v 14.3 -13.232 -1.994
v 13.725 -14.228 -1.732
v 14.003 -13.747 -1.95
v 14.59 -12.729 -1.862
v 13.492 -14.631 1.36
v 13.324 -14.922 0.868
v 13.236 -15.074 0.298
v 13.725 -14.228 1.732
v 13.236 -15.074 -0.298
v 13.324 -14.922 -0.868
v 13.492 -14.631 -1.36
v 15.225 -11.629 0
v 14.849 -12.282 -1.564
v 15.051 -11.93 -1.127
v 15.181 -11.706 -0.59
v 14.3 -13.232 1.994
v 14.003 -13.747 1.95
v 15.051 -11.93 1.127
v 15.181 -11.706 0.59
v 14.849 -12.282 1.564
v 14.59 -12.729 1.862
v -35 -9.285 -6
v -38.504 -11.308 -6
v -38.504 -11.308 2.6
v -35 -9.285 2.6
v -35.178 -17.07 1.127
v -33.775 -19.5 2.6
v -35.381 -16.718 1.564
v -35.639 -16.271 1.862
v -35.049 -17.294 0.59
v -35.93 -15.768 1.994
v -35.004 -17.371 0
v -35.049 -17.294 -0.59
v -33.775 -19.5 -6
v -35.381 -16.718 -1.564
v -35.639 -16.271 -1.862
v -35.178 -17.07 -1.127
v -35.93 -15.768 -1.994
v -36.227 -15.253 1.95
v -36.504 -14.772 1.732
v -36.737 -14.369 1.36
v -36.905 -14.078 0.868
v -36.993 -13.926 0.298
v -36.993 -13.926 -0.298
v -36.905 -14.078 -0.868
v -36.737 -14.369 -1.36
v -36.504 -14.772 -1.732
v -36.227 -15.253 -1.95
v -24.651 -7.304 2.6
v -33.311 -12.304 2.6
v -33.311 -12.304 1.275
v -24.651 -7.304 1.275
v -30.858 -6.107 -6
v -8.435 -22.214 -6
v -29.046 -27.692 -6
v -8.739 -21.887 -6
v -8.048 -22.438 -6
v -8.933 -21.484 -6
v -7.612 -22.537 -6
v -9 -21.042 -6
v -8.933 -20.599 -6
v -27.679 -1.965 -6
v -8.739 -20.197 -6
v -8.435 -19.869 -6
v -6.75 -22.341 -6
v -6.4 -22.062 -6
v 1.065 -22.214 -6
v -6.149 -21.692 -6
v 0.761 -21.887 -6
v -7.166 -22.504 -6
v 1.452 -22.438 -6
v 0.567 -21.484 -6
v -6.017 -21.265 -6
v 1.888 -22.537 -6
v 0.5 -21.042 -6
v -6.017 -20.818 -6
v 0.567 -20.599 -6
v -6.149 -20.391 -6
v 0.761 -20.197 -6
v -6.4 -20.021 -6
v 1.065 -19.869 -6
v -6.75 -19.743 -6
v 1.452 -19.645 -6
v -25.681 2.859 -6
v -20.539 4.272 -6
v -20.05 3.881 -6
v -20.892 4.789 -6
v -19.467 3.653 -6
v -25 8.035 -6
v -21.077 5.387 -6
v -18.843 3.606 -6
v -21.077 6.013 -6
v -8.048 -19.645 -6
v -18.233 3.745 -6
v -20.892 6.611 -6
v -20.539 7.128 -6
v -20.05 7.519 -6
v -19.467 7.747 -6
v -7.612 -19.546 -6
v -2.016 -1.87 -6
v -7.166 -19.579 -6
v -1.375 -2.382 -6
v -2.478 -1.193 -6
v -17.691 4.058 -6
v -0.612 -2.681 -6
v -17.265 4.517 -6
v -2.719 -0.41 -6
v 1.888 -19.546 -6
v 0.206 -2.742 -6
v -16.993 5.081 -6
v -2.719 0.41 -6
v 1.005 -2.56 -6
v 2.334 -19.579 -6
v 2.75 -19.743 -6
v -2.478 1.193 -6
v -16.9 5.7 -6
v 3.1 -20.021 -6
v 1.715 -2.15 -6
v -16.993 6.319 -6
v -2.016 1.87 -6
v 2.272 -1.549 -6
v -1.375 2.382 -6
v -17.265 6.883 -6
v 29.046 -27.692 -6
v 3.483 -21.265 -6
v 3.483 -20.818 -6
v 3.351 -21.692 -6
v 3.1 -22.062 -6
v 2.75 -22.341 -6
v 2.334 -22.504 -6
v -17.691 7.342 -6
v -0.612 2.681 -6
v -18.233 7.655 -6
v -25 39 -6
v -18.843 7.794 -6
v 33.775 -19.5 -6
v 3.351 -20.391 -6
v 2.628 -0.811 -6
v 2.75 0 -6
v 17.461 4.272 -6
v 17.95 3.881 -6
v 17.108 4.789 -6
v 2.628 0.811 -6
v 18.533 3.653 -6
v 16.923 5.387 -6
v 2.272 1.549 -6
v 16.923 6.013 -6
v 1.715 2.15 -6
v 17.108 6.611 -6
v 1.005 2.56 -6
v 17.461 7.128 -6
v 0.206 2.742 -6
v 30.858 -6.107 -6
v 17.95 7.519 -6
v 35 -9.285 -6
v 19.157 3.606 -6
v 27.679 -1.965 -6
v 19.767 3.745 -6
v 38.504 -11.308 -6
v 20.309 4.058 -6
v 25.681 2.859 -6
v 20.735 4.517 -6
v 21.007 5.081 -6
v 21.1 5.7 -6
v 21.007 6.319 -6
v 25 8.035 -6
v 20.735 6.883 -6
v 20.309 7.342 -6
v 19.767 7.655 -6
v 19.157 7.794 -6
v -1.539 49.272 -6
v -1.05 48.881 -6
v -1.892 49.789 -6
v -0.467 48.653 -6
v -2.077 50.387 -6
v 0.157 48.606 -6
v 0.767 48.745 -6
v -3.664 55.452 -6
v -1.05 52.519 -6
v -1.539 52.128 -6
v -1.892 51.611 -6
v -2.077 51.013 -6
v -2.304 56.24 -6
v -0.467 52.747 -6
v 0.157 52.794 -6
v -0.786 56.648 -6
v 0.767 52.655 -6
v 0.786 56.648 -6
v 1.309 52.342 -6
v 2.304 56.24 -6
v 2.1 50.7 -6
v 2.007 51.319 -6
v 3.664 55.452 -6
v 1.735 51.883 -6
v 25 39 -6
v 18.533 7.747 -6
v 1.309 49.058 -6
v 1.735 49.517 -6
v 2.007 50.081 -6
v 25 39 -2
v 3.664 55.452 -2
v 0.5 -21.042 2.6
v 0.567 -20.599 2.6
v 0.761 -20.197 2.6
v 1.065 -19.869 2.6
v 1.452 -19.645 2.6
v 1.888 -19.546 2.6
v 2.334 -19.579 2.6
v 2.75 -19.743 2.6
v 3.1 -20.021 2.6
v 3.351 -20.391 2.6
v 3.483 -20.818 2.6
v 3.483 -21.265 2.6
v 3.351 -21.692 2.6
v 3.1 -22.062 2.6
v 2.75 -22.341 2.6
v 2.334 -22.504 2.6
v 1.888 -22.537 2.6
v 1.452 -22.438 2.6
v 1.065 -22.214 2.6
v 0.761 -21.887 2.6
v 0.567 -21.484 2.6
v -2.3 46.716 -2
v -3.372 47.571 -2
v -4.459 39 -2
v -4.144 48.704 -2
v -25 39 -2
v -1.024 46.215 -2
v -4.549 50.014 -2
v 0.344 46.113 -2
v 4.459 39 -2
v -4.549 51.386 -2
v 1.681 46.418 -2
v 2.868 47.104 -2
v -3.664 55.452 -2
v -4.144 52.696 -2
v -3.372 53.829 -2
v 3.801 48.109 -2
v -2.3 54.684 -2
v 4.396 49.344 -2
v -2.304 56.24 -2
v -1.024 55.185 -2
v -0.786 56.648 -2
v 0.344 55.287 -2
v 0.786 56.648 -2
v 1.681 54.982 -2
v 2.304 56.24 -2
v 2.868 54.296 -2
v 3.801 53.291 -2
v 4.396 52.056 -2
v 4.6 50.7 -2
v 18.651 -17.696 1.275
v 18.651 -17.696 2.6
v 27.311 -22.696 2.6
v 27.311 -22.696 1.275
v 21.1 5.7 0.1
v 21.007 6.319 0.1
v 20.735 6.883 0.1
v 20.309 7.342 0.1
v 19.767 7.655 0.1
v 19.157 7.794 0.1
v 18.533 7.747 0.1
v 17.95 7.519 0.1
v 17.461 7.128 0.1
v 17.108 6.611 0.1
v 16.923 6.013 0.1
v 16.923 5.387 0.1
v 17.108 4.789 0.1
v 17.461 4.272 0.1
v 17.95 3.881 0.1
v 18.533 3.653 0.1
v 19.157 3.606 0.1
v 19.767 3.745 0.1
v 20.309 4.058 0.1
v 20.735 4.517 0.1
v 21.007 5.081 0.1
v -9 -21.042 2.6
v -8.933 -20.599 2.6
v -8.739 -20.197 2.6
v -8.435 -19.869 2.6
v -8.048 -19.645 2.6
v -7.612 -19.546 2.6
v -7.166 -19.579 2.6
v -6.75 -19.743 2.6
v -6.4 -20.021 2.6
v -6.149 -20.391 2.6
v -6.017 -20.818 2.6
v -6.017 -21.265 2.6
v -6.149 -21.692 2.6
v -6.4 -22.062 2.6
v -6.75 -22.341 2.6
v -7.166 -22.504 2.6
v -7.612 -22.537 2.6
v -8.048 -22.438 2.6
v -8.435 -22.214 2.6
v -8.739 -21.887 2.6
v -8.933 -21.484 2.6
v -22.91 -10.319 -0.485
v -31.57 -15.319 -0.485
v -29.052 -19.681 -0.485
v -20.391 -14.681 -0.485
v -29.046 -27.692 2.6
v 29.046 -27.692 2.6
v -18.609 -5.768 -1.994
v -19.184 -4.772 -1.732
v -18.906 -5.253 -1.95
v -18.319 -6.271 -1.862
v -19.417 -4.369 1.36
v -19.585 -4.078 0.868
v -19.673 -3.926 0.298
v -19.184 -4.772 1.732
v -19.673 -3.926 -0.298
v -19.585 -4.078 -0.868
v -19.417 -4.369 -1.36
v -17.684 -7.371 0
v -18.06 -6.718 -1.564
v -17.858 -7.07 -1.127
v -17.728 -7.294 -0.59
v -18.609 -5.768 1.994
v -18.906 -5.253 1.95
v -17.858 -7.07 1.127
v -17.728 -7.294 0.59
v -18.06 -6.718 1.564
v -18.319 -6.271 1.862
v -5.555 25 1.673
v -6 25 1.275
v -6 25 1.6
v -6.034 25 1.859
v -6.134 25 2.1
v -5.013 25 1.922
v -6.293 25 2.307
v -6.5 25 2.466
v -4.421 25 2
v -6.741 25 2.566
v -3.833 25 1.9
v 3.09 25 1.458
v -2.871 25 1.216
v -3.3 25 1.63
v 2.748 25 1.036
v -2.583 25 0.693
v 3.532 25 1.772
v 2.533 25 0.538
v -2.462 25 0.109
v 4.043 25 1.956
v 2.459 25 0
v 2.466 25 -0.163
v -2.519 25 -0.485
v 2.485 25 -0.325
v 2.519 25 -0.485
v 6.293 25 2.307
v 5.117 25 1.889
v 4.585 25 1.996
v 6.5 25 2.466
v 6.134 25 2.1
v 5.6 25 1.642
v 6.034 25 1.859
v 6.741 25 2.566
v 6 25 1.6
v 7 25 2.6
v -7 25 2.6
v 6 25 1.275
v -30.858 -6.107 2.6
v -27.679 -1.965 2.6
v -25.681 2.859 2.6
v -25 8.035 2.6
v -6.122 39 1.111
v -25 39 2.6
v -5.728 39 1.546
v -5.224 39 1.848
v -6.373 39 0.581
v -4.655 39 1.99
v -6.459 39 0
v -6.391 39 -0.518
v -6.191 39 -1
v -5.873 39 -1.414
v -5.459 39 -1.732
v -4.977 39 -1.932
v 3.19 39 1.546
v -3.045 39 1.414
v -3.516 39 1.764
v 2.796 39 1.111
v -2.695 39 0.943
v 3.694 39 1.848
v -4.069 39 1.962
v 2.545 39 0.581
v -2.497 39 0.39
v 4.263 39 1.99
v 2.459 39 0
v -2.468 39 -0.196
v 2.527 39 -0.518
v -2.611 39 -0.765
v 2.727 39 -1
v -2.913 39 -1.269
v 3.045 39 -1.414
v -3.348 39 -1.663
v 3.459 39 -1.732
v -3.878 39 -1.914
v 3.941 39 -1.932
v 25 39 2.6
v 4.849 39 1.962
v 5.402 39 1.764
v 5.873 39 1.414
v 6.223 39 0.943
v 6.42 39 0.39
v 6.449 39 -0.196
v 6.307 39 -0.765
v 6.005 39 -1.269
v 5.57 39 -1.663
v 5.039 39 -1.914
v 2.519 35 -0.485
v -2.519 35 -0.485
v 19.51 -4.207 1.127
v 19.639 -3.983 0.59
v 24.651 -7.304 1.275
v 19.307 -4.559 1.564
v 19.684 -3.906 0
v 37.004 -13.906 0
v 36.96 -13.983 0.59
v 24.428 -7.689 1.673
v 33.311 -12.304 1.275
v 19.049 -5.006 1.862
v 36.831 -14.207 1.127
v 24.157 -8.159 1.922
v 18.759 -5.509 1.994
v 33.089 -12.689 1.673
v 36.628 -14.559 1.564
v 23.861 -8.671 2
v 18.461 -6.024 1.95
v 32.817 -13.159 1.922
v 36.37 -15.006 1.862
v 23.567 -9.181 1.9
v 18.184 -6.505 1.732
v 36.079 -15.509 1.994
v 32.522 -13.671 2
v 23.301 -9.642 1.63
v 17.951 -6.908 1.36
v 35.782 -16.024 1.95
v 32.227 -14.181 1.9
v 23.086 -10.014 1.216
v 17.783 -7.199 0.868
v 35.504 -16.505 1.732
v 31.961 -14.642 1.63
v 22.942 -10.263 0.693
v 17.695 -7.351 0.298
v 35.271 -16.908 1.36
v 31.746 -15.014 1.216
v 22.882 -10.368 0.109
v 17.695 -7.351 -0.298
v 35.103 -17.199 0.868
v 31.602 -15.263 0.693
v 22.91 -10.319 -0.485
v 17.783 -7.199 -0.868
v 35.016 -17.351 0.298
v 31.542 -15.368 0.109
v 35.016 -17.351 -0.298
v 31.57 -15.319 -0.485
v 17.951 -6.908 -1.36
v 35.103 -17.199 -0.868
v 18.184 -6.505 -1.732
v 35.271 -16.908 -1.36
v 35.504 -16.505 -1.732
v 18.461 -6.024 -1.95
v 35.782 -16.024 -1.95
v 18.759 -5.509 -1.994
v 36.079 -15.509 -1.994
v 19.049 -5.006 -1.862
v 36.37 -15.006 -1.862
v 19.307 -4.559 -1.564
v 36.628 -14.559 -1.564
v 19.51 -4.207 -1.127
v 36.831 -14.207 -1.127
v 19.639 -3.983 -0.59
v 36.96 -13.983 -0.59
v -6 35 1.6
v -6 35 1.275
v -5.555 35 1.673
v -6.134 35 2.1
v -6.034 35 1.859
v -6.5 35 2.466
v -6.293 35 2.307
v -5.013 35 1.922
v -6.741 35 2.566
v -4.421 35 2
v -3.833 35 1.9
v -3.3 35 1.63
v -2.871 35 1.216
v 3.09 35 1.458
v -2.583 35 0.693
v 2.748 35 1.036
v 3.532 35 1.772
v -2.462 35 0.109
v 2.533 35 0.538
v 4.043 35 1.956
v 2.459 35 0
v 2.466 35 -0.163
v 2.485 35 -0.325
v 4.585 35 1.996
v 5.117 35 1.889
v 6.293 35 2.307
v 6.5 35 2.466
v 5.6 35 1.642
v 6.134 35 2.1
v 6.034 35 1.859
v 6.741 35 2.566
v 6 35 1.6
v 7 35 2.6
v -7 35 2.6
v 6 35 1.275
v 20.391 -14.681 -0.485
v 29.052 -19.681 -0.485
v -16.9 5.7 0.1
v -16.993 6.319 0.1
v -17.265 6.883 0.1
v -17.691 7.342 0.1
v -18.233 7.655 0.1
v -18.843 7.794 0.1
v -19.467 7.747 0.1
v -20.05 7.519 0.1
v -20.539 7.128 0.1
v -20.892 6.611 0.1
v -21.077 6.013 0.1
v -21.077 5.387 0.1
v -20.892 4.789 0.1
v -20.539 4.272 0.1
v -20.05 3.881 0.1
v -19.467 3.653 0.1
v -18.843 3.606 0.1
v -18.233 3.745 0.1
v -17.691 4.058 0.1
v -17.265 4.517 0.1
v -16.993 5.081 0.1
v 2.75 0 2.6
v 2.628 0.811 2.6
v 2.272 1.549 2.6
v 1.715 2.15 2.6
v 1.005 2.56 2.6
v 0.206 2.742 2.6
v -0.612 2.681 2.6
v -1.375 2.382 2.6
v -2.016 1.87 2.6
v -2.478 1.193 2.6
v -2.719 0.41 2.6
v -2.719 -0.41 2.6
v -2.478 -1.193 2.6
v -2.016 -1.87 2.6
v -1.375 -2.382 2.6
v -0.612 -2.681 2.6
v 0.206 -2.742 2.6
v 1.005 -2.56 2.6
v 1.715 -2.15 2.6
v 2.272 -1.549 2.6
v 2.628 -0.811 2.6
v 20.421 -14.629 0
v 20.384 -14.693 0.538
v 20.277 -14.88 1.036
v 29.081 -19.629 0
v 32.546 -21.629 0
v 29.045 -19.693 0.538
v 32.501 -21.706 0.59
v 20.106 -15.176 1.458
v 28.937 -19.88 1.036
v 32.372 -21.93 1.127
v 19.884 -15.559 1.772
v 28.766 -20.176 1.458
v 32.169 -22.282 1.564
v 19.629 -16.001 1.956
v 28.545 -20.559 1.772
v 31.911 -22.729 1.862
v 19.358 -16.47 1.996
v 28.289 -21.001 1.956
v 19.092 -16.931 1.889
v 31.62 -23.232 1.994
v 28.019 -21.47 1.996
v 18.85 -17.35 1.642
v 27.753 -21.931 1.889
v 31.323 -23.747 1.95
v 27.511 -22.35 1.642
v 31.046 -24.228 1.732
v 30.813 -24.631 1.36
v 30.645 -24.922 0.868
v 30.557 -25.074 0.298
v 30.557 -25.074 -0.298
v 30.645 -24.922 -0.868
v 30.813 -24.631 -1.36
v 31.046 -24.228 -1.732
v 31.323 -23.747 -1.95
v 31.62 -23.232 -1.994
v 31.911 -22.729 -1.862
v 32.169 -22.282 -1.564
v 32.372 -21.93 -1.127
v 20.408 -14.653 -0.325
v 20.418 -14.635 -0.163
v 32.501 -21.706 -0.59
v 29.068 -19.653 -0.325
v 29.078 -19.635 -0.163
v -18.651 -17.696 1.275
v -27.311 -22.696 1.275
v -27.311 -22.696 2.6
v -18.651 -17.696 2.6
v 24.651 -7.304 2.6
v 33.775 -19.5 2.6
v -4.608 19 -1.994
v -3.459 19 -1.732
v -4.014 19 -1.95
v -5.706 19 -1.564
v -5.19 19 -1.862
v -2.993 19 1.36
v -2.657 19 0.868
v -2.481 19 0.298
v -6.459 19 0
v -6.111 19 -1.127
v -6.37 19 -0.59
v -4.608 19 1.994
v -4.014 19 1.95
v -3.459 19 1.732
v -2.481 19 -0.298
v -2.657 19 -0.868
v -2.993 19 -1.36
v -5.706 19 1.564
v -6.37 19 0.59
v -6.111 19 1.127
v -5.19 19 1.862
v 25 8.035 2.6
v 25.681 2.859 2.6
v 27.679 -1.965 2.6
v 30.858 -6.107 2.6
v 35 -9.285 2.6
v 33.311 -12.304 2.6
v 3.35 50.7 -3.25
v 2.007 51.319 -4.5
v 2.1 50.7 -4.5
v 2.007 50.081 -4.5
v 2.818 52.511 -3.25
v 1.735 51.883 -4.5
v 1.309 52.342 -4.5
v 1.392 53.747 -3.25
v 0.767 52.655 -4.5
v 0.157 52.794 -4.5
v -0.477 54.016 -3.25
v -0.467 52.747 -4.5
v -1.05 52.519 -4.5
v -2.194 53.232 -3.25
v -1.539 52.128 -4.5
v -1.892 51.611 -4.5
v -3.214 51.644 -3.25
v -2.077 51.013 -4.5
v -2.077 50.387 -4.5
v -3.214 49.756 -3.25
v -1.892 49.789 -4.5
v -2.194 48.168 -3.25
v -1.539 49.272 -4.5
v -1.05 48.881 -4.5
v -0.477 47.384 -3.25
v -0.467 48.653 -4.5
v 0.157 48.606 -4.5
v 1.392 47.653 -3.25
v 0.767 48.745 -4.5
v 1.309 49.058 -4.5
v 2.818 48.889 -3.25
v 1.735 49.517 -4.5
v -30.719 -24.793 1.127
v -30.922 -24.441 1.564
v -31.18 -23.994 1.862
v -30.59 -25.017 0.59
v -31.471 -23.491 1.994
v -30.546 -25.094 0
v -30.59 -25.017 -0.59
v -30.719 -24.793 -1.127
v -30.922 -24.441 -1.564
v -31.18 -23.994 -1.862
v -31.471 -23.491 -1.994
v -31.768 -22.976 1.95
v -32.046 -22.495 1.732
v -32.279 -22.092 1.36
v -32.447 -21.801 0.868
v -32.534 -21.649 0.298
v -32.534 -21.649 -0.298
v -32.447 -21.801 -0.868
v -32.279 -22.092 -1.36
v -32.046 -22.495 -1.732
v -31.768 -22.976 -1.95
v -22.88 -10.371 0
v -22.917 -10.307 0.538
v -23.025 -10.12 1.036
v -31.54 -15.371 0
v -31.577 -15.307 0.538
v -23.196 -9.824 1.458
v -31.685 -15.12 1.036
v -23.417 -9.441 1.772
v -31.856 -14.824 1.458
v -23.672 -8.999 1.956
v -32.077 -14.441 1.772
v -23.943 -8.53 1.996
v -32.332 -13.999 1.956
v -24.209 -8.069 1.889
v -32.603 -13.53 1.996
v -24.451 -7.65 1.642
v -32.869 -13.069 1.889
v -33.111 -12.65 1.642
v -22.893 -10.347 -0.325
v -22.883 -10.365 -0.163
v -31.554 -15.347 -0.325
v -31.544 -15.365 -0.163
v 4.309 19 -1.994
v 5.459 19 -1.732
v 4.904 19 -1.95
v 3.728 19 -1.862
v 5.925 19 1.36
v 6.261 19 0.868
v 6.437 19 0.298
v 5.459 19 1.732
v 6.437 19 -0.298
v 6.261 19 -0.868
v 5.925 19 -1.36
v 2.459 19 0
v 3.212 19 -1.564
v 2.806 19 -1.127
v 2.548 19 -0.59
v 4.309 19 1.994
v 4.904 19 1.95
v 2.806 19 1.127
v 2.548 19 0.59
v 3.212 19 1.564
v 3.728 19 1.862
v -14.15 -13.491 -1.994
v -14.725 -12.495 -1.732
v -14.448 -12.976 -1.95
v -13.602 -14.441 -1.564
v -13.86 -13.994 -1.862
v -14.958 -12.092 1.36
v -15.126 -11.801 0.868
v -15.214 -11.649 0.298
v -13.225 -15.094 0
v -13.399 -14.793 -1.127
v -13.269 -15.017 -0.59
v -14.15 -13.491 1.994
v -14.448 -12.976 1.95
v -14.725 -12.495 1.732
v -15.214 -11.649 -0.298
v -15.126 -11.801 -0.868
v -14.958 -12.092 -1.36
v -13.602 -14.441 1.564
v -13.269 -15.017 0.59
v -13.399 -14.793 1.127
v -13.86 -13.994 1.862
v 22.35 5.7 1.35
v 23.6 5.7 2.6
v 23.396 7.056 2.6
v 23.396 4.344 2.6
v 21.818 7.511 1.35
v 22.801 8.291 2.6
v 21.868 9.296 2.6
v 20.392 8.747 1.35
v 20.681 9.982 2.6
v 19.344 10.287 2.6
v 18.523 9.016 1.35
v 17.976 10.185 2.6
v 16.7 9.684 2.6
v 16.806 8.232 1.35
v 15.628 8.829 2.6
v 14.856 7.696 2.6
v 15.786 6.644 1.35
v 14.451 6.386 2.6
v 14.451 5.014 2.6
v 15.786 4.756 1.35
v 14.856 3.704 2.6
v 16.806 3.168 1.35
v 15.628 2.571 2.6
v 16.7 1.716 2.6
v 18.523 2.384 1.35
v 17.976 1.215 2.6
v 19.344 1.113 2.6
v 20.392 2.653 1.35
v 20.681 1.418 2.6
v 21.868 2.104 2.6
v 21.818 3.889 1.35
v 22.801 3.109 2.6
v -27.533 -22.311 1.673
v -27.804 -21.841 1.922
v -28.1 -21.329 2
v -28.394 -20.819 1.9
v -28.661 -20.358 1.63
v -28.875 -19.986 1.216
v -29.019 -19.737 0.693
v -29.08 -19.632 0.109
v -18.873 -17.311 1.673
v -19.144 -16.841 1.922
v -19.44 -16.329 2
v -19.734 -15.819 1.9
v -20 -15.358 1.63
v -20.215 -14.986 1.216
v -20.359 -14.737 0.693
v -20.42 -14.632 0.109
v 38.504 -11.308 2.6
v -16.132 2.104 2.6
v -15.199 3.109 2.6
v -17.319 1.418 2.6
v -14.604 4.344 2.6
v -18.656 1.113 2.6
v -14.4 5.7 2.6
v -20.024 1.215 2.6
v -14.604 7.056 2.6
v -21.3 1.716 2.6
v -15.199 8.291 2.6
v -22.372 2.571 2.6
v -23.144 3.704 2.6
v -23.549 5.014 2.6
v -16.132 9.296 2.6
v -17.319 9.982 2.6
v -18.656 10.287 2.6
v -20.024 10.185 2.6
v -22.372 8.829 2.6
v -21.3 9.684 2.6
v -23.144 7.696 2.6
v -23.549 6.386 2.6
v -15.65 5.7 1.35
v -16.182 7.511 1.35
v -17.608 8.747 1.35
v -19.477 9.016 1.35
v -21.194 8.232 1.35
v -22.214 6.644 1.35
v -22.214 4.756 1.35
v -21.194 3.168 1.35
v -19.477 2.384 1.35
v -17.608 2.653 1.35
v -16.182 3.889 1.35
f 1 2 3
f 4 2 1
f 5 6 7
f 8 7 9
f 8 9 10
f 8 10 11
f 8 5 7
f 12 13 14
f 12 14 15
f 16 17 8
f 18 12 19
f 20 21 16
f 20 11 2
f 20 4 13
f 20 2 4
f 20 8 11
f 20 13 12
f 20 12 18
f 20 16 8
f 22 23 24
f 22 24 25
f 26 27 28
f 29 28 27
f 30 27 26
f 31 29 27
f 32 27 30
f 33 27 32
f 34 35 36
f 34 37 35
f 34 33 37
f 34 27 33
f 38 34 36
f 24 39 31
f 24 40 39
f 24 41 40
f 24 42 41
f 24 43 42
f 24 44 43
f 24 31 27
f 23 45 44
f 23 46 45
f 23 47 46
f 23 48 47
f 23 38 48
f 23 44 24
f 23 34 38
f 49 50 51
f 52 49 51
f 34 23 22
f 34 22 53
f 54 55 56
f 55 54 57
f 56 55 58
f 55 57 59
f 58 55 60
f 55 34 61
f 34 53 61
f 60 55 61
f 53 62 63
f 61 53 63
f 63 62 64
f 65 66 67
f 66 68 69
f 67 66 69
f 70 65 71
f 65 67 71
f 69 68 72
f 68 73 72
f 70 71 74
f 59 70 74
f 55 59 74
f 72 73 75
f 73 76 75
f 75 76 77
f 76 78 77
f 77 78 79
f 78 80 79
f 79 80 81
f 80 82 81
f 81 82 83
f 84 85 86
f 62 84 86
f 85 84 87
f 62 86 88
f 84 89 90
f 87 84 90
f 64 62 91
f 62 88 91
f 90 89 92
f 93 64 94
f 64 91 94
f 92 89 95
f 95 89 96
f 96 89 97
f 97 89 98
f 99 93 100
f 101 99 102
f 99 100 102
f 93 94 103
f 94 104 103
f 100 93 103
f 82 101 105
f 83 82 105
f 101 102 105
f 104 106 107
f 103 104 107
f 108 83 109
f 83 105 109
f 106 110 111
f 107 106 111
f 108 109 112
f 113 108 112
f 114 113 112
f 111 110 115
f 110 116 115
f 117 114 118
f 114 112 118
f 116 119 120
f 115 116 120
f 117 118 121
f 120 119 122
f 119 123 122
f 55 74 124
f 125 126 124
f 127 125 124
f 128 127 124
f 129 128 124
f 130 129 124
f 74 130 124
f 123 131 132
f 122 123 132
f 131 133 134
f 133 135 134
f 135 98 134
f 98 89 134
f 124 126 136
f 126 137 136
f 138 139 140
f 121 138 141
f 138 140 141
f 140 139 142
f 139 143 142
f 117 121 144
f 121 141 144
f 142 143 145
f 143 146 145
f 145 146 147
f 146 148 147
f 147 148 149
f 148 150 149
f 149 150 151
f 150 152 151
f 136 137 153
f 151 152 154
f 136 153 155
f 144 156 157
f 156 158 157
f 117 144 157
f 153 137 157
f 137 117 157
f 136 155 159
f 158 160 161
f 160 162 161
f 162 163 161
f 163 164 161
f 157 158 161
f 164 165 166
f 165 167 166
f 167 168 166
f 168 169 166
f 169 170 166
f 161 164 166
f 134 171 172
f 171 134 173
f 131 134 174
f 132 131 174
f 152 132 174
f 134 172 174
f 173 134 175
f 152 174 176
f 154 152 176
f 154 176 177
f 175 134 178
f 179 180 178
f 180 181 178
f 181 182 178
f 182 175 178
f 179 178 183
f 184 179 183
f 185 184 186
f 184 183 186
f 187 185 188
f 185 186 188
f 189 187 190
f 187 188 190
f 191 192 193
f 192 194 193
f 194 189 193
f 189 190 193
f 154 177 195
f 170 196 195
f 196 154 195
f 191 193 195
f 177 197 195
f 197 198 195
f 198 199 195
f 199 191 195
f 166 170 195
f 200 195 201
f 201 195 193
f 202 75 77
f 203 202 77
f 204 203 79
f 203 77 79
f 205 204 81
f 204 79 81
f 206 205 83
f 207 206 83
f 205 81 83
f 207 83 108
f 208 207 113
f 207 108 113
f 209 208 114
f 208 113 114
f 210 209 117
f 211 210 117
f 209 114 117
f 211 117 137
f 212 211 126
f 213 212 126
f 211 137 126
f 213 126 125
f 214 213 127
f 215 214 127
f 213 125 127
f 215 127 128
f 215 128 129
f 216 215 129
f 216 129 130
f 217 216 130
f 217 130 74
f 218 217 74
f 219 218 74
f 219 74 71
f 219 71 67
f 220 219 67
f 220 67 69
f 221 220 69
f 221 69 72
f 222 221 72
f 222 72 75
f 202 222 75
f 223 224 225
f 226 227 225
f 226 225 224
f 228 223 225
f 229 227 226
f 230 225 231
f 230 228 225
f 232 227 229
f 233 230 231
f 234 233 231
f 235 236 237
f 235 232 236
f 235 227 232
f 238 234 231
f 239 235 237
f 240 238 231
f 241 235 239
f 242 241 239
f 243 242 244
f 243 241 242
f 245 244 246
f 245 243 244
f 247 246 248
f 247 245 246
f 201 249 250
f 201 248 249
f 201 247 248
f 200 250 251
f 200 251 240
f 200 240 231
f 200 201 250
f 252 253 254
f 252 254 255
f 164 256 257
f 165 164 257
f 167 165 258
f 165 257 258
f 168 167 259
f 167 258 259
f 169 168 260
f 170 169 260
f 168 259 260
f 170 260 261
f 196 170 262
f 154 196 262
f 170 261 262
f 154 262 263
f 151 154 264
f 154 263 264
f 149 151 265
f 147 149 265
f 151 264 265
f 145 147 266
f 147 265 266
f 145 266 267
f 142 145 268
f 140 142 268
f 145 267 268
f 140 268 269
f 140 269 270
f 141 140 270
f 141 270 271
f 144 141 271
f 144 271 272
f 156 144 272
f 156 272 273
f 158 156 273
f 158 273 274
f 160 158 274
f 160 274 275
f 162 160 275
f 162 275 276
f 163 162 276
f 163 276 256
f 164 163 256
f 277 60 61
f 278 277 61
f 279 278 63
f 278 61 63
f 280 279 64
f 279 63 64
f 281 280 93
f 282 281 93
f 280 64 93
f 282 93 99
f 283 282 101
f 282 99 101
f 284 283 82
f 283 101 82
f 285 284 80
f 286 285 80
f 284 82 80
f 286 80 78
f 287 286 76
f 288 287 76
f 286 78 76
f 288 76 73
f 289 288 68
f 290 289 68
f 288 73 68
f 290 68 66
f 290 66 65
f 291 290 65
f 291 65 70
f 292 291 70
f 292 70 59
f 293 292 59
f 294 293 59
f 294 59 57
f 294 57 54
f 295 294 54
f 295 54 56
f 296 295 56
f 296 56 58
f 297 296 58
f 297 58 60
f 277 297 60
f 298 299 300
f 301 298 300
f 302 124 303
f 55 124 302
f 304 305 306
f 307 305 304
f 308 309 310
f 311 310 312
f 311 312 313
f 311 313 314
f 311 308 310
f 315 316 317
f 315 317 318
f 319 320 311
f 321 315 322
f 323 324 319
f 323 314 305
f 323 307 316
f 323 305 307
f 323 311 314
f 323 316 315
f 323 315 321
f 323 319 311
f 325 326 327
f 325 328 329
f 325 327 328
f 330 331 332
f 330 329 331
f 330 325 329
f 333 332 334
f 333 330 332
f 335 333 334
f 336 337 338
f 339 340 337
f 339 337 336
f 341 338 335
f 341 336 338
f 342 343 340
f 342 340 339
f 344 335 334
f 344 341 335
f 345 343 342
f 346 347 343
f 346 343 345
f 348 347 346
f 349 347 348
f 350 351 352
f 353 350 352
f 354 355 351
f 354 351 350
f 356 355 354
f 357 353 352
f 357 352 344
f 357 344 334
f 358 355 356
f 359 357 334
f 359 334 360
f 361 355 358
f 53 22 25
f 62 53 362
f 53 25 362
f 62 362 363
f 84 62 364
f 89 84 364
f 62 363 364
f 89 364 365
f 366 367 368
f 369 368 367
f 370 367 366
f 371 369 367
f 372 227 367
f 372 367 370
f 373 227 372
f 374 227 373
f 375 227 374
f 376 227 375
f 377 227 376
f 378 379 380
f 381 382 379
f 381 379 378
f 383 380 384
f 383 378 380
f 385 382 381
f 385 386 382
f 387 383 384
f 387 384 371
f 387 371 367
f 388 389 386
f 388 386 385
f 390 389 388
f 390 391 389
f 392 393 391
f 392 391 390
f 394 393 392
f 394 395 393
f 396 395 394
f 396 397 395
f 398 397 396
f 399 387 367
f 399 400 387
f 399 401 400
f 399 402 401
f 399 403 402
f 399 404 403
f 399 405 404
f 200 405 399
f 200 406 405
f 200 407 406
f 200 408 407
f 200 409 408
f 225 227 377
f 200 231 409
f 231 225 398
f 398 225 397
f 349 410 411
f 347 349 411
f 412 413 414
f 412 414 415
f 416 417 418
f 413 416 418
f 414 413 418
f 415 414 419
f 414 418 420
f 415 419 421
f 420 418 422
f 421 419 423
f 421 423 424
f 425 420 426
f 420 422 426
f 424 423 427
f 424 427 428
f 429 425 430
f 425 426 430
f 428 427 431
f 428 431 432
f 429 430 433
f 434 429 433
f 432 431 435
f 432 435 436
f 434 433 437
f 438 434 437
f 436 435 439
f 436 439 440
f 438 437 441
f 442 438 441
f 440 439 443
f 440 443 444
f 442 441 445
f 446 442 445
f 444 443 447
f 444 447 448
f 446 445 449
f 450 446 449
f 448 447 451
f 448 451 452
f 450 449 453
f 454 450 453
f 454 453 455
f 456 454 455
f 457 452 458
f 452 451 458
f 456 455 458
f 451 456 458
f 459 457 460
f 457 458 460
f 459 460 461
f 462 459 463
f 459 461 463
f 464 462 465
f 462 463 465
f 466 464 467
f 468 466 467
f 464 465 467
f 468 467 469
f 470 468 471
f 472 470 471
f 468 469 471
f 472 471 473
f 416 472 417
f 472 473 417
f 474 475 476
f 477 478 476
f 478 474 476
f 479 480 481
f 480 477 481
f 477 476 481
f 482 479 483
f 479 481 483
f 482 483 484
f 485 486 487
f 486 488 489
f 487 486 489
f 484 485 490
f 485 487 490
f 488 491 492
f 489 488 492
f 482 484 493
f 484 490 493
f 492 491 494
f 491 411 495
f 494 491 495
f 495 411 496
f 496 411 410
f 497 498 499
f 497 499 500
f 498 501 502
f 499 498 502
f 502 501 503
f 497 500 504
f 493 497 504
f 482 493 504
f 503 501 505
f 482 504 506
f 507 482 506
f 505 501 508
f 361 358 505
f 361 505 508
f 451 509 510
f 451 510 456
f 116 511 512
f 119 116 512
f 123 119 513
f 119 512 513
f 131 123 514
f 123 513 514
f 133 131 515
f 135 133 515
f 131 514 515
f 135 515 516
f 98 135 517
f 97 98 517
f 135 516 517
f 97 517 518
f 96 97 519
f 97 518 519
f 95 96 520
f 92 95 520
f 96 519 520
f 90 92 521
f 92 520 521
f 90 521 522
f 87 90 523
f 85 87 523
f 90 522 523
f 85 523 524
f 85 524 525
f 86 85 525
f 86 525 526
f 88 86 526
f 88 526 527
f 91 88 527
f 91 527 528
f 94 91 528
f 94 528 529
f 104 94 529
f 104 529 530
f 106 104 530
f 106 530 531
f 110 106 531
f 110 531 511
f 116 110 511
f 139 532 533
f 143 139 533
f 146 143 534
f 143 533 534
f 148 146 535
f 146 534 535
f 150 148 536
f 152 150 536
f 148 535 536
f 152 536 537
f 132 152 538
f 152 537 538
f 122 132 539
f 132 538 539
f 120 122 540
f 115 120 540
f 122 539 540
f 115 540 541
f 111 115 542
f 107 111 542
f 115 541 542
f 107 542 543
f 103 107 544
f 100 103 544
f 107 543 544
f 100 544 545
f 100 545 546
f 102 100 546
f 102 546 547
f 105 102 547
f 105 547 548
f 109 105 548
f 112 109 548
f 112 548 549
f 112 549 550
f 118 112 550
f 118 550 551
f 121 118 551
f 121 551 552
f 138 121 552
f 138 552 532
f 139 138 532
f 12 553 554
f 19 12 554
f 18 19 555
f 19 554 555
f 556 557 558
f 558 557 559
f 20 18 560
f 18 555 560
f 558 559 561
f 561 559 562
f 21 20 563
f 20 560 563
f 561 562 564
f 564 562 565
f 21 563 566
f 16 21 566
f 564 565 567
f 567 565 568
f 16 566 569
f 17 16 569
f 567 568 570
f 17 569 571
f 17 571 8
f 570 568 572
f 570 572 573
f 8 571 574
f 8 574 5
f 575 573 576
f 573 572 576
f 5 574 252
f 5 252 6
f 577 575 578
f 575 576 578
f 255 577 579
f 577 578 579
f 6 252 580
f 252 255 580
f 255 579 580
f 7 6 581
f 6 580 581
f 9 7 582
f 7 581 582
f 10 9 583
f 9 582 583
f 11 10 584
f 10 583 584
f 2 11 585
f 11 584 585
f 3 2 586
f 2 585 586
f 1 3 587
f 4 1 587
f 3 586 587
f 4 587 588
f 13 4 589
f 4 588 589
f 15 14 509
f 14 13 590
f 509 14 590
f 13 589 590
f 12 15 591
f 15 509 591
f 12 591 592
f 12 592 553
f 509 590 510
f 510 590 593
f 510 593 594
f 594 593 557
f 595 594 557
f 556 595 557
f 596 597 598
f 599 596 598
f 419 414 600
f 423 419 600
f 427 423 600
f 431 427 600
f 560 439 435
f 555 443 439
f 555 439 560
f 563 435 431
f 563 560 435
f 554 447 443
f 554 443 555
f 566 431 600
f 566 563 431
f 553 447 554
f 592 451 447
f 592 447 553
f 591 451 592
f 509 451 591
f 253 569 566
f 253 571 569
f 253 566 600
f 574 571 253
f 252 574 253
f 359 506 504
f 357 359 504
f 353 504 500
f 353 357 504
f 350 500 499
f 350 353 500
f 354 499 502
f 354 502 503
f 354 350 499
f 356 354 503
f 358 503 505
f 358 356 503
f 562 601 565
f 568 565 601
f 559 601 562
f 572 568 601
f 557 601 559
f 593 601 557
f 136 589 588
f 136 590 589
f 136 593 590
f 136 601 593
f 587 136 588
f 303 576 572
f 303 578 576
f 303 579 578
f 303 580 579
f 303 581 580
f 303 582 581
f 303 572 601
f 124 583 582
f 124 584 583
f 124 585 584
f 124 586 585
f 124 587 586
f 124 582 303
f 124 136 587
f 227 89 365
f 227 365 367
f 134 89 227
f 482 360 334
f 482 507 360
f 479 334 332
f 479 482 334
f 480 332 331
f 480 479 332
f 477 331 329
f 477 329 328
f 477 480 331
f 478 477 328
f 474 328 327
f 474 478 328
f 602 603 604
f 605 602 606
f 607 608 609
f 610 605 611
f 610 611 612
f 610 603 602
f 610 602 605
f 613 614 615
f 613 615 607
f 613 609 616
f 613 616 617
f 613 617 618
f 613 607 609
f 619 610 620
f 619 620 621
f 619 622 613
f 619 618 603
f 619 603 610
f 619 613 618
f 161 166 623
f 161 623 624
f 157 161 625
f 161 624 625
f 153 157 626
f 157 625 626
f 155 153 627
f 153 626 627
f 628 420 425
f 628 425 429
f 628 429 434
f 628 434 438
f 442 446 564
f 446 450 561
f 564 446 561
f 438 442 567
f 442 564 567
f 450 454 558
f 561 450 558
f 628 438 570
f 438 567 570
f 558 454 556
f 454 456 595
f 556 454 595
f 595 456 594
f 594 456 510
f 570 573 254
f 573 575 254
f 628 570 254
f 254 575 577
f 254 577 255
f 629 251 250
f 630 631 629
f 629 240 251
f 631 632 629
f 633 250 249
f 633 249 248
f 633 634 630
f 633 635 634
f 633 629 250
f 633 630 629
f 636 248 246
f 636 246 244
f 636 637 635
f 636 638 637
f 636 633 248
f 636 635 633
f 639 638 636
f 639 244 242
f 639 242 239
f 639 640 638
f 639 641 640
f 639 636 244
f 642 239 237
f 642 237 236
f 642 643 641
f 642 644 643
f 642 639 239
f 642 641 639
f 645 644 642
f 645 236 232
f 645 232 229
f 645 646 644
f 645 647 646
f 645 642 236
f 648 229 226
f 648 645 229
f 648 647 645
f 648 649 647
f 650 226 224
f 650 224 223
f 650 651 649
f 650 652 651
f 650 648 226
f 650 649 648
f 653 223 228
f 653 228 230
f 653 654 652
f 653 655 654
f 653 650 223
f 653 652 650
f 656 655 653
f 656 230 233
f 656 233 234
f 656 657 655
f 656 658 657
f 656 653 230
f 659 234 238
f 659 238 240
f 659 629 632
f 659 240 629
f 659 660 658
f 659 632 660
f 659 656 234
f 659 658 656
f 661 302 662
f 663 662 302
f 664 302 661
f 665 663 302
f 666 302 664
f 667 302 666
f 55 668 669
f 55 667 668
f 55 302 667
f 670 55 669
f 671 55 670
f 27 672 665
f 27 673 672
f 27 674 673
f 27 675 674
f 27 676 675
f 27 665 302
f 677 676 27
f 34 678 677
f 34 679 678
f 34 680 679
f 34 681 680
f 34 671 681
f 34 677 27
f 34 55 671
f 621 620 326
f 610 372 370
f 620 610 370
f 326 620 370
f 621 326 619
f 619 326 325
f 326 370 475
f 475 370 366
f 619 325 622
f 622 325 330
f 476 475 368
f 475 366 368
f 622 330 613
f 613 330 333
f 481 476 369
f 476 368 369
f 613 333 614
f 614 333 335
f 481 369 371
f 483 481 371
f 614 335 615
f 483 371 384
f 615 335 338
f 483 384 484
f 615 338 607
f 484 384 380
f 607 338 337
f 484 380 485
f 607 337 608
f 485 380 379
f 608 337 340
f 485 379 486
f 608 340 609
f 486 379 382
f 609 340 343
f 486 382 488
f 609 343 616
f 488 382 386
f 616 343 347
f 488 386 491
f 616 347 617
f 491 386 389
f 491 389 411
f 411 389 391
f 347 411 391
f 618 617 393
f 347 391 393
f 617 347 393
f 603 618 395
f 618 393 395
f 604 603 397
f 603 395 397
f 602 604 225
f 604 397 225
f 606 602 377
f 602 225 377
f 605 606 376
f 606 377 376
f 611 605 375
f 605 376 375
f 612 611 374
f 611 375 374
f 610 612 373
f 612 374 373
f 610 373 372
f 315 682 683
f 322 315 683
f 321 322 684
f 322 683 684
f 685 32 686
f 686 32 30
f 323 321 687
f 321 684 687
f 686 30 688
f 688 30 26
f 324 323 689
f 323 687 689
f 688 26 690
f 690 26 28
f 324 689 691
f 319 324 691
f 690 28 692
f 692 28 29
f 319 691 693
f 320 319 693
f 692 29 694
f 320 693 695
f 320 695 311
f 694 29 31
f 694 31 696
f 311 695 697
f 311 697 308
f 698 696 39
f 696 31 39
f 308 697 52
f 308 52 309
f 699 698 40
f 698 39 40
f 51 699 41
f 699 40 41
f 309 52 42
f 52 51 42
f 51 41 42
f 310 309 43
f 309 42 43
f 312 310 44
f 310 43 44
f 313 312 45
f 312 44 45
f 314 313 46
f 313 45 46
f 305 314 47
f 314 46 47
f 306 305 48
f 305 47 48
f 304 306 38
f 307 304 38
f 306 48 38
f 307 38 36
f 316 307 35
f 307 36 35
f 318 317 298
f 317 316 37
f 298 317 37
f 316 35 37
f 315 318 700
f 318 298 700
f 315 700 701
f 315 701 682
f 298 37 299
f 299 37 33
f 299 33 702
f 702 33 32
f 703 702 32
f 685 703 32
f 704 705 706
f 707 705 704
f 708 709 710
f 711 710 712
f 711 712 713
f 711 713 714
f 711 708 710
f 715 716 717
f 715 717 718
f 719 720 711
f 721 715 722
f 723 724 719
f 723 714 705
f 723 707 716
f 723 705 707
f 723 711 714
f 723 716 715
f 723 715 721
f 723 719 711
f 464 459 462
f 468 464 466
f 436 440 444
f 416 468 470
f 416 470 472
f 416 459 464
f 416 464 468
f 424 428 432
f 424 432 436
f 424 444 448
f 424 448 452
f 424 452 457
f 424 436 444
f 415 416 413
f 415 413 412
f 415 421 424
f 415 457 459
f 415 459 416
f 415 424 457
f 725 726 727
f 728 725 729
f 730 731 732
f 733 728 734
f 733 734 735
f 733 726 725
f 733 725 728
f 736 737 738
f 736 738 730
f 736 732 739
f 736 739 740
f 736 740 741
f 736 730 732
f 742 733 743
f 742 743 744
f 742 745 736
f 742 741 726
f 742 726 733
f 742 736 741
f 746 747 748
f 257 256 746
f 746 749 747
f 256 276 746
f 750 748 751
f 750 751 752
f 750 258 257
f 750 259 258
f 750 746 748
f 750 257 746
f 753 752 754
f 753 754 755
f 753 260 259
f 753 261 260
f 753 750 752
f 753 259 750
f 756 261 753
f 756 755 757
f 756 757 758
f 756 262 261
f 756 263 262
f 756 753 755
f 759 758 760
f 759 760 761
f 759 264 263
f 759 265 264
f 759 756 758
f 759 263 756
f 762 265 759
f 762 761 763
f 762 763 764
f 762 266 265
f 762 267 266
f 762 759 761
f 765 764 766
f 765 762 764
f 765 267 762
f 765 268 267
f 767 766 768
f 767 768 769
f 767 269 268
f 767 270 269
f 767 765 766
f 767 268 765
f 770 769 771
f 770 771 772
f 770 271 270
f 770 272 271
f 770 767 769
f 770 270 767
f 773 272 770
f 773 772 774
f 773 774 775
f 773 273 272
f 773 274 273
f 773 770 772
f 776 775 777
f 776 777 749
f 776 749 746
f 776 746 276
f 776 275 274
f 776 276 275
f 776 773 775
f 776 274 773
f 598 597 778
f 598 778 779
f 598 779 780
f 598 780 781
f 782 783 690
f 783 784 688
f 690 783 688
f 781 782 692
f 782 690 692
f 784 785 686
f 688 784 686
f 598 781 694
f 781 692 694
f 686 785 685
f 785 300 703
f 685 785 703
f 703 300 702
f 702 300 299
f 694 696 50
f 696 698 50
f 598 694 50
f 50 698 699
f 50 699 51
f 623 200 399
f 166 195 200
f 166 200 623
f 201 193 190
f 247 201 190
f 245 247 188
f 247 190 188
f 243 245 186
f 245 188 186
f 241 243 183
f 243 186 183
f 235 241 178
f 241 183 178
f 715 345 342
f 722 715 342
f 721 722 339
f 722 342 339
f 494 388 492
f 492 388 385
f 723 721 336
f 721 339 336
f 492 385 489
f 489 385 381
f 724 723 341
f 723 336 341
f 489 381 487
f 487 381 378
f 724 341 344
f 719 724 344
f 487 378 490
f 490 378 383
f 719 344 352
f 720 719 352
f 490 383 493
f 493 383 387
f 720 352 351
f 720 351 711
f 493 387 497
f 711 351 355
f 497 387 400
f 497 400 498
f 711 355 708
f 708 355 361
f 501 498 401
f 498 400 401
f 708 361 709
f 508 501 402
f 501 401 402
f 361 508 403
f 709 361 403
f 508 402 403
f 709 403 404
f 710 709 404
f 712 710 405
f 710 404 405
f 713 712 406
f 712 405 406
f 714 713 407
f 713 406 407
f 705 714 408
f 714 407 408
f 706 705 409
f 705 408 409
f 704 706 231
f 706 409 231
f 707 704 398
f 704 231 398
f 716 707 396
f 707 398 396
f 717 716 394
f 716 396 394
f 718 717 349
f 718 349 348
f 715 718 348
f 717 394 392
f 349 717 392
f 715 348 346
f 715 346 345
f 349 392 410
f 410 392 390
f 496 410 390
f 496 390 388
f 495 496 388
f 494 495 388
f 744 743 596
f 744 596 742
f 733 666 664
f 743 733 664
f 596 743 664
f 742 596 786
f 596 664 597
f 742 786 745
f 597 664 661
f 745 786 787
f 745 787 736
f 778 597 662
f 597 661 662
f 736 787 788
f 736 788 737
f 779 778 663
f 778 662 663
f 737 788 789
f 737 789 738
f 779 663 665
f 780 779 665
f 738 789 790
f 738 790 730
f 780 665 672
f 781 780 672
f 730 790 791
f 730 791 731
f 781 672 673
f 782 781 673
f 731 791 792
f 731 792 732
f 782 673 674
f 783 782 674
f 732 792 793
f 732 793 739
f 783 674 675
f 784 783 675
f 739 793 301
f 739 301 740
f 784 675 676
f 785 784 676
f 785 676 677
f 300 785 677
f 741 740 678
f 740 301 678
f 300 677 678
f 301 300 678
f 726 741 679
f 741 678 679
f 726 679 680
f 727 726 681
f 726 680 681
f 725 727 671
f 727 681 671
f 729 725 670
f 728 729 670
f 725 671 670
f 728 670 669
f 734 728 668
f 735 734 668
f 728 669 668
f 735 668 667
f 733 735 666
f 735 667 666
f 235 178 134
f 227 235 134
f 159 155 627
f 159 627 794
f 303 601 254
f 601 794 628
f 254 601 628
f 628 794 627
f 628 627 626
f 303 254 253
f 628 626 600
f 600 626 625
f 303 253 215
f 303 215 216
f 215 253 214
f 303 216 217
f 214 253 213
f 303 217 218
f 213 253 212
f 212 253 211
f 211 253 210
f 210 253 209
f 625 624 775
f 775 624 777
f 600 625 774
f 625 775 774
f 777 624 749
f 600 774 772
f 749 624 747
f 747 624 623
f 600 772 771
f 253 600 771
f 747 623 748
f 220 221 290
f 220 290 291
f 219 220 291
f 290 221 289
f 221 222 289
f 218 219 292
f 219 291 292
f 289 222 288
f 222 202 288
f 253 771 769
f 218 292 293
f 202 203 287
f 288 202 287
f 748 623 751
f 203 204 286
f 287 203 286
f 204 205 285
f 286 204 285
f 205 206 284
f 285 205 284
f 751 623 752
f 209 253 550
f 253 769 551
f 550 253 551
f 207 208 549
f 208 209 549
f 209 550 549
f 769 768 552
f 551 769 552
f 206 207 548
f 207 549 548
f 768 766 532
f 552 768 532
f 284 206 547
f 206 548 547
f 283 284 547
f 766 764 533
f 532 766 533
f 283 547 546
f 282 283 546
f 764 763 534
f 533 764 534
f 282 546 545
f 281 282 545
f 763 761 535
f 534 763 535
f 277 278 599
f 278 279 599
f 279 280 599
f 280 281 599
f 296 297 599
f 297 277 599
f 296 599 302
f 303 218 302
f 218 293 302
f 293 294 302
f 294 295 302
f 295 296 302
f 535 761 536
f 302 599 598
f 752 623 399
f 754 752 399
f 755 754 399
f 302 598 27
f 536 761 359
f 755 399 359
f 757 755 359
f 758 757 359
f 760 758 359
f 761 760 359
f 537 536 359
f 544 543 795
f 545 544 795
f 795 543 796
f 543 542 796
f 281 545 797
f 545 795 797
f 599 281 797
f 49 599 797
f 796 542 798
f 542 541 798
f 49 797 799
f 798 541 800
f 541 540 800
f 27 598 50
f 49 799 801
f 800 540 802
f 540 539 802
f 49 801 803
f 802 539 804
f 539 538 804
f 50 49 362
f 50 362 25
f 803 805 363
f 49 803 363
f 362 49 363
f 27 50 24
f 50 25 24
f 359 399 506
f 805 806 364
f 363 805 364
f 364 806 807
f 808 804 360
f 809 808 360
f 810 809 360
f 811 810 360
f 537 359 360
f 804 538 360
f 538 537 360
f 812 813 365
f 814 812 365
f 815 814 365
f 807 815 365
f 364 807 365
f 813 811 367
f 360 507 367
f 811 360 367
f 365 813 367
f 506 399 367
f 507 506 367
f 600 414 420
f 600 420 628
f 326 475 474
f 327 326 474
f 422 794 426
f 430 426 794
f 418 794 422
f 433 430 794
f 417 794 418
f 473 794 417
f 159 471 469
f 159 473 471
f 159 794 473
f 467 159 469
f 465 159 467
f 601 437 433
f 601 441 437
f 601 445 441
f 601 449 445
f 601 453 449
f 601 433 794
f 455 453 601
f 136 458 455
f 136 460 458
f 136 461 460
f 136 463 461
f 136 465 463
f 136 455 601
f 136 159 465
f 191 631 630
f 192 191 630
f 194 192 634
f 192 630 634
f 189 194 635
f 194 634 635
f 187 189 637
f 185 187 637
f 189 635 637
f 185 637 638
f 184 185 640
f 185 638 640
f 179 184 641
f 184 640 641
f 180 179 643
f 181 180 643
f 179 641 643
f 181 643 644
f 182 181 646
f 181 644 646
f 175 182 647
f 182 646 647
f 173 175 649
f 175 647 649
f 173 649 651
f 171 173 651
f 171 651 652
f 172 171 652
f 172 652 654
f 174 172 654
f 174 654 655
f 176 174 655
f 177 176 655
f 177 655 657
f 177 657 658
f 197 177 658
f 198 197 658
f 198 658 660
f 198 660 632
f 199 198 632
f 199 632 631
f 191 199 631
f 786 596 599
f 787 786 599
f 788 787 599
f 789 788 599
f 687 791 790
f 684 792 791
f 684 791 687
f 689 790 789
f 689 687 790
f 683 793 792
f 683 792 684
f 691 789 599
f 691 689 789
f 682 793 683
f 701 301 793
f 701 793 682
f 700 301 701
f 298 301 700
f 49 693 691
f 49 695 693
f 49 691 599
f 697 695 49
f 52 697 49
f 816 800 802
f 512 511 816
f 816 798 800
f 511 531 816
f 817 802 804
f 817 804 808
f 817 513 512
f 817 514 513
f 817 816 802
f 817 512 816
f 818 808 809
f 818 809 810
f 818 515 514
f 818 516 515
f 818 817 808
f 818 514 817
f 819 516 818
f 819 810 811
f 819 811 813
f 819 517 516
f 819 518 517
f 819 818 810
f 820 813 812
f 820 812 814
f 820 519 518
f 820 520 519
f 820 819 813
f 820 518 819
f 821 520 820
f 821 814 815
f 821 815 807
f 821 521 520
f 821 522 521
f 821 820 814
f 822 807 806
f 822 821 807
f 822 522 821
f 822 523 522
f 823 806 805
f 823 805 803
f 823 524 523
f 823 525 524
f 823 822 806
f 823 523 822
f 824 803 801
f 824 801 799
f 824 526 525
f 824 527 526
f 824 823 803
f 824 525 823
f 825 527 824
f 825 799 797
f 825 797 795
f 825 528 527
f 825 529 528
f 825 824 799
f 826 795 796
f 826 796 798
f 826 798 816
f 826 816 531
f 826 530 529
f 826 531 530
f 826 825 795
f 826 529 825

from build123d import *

# Parameters (mm, degrees)
BOSS_EXTRUDE1_DEPTH      = 2.6
BOSS_EXTRUDE1_DEPTH_BACK = 6
FILLET1_R                = 20
CUT_EXTRUDE1_DEPTH       = 5
SKETCH5_R                = 2
CUT_EXTRUDE2_DEPTH       = 20
FILLET3_R                = 1
CIRPATTERN1_COUNT        = 3
SKETCH6_R                = 2.75
CUT_EXTRUDE3_DEPTH       = 56.475677209
BOSS_EXTRUDE2_DEPTH      = 4
SKETCH8_R                = 2.1
CUT_EXTRUDE4_DEPTH       = 70.075616261
CHAMFER1_SIZE            = 2.5
SKETCH9_R                = 1.5
CUT_EXTRUDE5_DEPTH       = 70.075616261


with BuildPart() as part:
    # Sketch3 → Boss-Extrude1 (new, two sides: drawn at the far end of the back side and taken through both)
    with BuildSketch(Plane.XY.offset(-BOSS_EXTRUDE1_DEPTH_BACK)):
        Polygon((-25, 39), (25, 39), (25, -3.511595657), (38.504425224, -11.308379196), (33.774990748, -19.5), (29.045556271, -27.691620804), (-29.045556271, -27.691620804), (-33.774990748, -19.5), (-38.504425224, -11.308379196), (-25, -3.511595657), align=None)
    extrude(amount=BOSS_EXTRUDE1_DEPTH + BOSS_EXTRUDE1_DEPTH_BACK)

    # Fillet1
    fillet1_edges = [part.edges().sort_by_distance(p)[0] for p in [
        (-25, -3.511595657, -1.7),
        (25, -3.511595657, -1.7),
    ]]
    fillet(fillet1_edges, radius=FILLET1_R)

    # Sketch4 → Cut-Extrude1 (cut, symmetric)
    with BuildSketch(Plane(origin=(0, 30, 0), x_dir=(1, 0, 0), z_dir=(0, 1, 0))):
        Polygon((5.114783638, 0.485216362), (-5.114783638, 0.485216362), (-6, -0.4), (-6, -2.6), (6, -2.6), (6, -0.4), align=None)
    cut_extrude1 = extrude(amount=CUT_EXTRUDE1_DEPTH, both=True, mode=Mode.SUBTRACT)

    # Sketch5 → Cut-Extrude2 (cut)
    with BuildSketch(Plane(origin=(0, 39, 0), x_dir=(1, 0, 0), z_dir=(0, 1, 0))):
        with Locations((-4.458868953, 0)):
            Circle(SKETCH5_R)
        with Locations((4.458868953, 0)):
            Circle(SKETCH5_R)
    cut_extrude2 = extrude(amount=-CUT_EXTRUDE2_DEPTH, mode=Mode.SUBTRACT)

    # Fillet3
    fillet3_edges = [part.edges().sort_by_distance(p)[0] for p in [
        (-6, 30, 2.6),
        (6, 30, 2.6),
    ]]
    fillet(fillet3_edges, radius=FILLET3_R)

    # CirPattern1: Cut-Extrude1, Cut-Extrude2 ×3 about axis
    cirpattern1_axis = Axis((0, 0, -80.9), (0, 0, 1))
    add([cut_extrude1.rotate(cirpattern1_axis, i * 360 / CIRPATTERN1_COUNT) for i in range(1, CIRPATTERN1_COUNT)], mode=Mode.SUBTRACT)
    add([cut_extrude2.rotate(cirpattern1_axis, i * 360 / CIRPATTERN1_COUNT) for i in range(1, CIRPATTERN1_COUNT)], mode=Mode.SUBTRACT)

    # Sketch6 → Cut-Extrude3 (cut, through all)
    with BuildSketch(Plane.XY.offset(2.6)):
        Circle(SKETCH6_R)
    extrude(amount=-CUT_EXTRUDE3_DEPTH, mode=Mode.SUBTRACT)

    # Sketch7 → Boss-Extrude2 (add)
    with BuildSketch(Plane(origin=(0, 0, -6), x_dir=(-1, 0, 0), z_dir=(0, 0, -1))):
        with BuildLine():
            Line((-25, 39), (-3.663721376, 55.451541401))
            ThreePointArc((-3.663721376, 55.451541401), (0, 56.7), (3.663721376, 55.451541401))
            Line((3.663721376, 55.451541401), (25, 39))
            Line((25, 39), (-25, 39))
        make_face()
    extrude(amount=-BOSS_EXTRUDE2_DEPTH)

    # Sketch8 → Cut-Extrude4 (cut, through all)
    with BuildSketch(Plane.XY.offset(2.6)):
        with Locations((-19, 5.7)):
            Circle(SKETCH8_R)
        with Locations((19, 5.7)):
            Circle(SKETCH8_R)
        with Locations((0, 50.7)):
            Circle(SKETCH8_R)
    extrude(amount=-CUT_EXTRUDE4_DEPTH, mode=Mode.SUBTRACT)

    # Chamfer1
    chamfer1_edges = [part.edges().sort_by_distance(p)[0] for p in [
        (-21.1, 5.7, 2.6),
        (16.9, 5.7, 2.6),
        (-2.1, 50.7, -2),
    ]]
    chamfer(chamfer1_edges, length=CHAMFER1_SIZE)

    # Sketch9 → Cut-Extrude5 (cut, through all)
    with BuildSketch(Plane(origin=(0, 0, -6), x_dir=(-1, 0, 0), z_dir=(0, 0, -1))):
        with Locations((7.5, -21.041620804)):
            Circle(SKETCH9_R)
        with Locations((-2, -21.041620804)):
            Circle(SKETCH9_R)
    extrude(amount=-CUT_EXTRUDE5_DEPTH, mode=Mode.SUBTRACT)


solid = part.part
